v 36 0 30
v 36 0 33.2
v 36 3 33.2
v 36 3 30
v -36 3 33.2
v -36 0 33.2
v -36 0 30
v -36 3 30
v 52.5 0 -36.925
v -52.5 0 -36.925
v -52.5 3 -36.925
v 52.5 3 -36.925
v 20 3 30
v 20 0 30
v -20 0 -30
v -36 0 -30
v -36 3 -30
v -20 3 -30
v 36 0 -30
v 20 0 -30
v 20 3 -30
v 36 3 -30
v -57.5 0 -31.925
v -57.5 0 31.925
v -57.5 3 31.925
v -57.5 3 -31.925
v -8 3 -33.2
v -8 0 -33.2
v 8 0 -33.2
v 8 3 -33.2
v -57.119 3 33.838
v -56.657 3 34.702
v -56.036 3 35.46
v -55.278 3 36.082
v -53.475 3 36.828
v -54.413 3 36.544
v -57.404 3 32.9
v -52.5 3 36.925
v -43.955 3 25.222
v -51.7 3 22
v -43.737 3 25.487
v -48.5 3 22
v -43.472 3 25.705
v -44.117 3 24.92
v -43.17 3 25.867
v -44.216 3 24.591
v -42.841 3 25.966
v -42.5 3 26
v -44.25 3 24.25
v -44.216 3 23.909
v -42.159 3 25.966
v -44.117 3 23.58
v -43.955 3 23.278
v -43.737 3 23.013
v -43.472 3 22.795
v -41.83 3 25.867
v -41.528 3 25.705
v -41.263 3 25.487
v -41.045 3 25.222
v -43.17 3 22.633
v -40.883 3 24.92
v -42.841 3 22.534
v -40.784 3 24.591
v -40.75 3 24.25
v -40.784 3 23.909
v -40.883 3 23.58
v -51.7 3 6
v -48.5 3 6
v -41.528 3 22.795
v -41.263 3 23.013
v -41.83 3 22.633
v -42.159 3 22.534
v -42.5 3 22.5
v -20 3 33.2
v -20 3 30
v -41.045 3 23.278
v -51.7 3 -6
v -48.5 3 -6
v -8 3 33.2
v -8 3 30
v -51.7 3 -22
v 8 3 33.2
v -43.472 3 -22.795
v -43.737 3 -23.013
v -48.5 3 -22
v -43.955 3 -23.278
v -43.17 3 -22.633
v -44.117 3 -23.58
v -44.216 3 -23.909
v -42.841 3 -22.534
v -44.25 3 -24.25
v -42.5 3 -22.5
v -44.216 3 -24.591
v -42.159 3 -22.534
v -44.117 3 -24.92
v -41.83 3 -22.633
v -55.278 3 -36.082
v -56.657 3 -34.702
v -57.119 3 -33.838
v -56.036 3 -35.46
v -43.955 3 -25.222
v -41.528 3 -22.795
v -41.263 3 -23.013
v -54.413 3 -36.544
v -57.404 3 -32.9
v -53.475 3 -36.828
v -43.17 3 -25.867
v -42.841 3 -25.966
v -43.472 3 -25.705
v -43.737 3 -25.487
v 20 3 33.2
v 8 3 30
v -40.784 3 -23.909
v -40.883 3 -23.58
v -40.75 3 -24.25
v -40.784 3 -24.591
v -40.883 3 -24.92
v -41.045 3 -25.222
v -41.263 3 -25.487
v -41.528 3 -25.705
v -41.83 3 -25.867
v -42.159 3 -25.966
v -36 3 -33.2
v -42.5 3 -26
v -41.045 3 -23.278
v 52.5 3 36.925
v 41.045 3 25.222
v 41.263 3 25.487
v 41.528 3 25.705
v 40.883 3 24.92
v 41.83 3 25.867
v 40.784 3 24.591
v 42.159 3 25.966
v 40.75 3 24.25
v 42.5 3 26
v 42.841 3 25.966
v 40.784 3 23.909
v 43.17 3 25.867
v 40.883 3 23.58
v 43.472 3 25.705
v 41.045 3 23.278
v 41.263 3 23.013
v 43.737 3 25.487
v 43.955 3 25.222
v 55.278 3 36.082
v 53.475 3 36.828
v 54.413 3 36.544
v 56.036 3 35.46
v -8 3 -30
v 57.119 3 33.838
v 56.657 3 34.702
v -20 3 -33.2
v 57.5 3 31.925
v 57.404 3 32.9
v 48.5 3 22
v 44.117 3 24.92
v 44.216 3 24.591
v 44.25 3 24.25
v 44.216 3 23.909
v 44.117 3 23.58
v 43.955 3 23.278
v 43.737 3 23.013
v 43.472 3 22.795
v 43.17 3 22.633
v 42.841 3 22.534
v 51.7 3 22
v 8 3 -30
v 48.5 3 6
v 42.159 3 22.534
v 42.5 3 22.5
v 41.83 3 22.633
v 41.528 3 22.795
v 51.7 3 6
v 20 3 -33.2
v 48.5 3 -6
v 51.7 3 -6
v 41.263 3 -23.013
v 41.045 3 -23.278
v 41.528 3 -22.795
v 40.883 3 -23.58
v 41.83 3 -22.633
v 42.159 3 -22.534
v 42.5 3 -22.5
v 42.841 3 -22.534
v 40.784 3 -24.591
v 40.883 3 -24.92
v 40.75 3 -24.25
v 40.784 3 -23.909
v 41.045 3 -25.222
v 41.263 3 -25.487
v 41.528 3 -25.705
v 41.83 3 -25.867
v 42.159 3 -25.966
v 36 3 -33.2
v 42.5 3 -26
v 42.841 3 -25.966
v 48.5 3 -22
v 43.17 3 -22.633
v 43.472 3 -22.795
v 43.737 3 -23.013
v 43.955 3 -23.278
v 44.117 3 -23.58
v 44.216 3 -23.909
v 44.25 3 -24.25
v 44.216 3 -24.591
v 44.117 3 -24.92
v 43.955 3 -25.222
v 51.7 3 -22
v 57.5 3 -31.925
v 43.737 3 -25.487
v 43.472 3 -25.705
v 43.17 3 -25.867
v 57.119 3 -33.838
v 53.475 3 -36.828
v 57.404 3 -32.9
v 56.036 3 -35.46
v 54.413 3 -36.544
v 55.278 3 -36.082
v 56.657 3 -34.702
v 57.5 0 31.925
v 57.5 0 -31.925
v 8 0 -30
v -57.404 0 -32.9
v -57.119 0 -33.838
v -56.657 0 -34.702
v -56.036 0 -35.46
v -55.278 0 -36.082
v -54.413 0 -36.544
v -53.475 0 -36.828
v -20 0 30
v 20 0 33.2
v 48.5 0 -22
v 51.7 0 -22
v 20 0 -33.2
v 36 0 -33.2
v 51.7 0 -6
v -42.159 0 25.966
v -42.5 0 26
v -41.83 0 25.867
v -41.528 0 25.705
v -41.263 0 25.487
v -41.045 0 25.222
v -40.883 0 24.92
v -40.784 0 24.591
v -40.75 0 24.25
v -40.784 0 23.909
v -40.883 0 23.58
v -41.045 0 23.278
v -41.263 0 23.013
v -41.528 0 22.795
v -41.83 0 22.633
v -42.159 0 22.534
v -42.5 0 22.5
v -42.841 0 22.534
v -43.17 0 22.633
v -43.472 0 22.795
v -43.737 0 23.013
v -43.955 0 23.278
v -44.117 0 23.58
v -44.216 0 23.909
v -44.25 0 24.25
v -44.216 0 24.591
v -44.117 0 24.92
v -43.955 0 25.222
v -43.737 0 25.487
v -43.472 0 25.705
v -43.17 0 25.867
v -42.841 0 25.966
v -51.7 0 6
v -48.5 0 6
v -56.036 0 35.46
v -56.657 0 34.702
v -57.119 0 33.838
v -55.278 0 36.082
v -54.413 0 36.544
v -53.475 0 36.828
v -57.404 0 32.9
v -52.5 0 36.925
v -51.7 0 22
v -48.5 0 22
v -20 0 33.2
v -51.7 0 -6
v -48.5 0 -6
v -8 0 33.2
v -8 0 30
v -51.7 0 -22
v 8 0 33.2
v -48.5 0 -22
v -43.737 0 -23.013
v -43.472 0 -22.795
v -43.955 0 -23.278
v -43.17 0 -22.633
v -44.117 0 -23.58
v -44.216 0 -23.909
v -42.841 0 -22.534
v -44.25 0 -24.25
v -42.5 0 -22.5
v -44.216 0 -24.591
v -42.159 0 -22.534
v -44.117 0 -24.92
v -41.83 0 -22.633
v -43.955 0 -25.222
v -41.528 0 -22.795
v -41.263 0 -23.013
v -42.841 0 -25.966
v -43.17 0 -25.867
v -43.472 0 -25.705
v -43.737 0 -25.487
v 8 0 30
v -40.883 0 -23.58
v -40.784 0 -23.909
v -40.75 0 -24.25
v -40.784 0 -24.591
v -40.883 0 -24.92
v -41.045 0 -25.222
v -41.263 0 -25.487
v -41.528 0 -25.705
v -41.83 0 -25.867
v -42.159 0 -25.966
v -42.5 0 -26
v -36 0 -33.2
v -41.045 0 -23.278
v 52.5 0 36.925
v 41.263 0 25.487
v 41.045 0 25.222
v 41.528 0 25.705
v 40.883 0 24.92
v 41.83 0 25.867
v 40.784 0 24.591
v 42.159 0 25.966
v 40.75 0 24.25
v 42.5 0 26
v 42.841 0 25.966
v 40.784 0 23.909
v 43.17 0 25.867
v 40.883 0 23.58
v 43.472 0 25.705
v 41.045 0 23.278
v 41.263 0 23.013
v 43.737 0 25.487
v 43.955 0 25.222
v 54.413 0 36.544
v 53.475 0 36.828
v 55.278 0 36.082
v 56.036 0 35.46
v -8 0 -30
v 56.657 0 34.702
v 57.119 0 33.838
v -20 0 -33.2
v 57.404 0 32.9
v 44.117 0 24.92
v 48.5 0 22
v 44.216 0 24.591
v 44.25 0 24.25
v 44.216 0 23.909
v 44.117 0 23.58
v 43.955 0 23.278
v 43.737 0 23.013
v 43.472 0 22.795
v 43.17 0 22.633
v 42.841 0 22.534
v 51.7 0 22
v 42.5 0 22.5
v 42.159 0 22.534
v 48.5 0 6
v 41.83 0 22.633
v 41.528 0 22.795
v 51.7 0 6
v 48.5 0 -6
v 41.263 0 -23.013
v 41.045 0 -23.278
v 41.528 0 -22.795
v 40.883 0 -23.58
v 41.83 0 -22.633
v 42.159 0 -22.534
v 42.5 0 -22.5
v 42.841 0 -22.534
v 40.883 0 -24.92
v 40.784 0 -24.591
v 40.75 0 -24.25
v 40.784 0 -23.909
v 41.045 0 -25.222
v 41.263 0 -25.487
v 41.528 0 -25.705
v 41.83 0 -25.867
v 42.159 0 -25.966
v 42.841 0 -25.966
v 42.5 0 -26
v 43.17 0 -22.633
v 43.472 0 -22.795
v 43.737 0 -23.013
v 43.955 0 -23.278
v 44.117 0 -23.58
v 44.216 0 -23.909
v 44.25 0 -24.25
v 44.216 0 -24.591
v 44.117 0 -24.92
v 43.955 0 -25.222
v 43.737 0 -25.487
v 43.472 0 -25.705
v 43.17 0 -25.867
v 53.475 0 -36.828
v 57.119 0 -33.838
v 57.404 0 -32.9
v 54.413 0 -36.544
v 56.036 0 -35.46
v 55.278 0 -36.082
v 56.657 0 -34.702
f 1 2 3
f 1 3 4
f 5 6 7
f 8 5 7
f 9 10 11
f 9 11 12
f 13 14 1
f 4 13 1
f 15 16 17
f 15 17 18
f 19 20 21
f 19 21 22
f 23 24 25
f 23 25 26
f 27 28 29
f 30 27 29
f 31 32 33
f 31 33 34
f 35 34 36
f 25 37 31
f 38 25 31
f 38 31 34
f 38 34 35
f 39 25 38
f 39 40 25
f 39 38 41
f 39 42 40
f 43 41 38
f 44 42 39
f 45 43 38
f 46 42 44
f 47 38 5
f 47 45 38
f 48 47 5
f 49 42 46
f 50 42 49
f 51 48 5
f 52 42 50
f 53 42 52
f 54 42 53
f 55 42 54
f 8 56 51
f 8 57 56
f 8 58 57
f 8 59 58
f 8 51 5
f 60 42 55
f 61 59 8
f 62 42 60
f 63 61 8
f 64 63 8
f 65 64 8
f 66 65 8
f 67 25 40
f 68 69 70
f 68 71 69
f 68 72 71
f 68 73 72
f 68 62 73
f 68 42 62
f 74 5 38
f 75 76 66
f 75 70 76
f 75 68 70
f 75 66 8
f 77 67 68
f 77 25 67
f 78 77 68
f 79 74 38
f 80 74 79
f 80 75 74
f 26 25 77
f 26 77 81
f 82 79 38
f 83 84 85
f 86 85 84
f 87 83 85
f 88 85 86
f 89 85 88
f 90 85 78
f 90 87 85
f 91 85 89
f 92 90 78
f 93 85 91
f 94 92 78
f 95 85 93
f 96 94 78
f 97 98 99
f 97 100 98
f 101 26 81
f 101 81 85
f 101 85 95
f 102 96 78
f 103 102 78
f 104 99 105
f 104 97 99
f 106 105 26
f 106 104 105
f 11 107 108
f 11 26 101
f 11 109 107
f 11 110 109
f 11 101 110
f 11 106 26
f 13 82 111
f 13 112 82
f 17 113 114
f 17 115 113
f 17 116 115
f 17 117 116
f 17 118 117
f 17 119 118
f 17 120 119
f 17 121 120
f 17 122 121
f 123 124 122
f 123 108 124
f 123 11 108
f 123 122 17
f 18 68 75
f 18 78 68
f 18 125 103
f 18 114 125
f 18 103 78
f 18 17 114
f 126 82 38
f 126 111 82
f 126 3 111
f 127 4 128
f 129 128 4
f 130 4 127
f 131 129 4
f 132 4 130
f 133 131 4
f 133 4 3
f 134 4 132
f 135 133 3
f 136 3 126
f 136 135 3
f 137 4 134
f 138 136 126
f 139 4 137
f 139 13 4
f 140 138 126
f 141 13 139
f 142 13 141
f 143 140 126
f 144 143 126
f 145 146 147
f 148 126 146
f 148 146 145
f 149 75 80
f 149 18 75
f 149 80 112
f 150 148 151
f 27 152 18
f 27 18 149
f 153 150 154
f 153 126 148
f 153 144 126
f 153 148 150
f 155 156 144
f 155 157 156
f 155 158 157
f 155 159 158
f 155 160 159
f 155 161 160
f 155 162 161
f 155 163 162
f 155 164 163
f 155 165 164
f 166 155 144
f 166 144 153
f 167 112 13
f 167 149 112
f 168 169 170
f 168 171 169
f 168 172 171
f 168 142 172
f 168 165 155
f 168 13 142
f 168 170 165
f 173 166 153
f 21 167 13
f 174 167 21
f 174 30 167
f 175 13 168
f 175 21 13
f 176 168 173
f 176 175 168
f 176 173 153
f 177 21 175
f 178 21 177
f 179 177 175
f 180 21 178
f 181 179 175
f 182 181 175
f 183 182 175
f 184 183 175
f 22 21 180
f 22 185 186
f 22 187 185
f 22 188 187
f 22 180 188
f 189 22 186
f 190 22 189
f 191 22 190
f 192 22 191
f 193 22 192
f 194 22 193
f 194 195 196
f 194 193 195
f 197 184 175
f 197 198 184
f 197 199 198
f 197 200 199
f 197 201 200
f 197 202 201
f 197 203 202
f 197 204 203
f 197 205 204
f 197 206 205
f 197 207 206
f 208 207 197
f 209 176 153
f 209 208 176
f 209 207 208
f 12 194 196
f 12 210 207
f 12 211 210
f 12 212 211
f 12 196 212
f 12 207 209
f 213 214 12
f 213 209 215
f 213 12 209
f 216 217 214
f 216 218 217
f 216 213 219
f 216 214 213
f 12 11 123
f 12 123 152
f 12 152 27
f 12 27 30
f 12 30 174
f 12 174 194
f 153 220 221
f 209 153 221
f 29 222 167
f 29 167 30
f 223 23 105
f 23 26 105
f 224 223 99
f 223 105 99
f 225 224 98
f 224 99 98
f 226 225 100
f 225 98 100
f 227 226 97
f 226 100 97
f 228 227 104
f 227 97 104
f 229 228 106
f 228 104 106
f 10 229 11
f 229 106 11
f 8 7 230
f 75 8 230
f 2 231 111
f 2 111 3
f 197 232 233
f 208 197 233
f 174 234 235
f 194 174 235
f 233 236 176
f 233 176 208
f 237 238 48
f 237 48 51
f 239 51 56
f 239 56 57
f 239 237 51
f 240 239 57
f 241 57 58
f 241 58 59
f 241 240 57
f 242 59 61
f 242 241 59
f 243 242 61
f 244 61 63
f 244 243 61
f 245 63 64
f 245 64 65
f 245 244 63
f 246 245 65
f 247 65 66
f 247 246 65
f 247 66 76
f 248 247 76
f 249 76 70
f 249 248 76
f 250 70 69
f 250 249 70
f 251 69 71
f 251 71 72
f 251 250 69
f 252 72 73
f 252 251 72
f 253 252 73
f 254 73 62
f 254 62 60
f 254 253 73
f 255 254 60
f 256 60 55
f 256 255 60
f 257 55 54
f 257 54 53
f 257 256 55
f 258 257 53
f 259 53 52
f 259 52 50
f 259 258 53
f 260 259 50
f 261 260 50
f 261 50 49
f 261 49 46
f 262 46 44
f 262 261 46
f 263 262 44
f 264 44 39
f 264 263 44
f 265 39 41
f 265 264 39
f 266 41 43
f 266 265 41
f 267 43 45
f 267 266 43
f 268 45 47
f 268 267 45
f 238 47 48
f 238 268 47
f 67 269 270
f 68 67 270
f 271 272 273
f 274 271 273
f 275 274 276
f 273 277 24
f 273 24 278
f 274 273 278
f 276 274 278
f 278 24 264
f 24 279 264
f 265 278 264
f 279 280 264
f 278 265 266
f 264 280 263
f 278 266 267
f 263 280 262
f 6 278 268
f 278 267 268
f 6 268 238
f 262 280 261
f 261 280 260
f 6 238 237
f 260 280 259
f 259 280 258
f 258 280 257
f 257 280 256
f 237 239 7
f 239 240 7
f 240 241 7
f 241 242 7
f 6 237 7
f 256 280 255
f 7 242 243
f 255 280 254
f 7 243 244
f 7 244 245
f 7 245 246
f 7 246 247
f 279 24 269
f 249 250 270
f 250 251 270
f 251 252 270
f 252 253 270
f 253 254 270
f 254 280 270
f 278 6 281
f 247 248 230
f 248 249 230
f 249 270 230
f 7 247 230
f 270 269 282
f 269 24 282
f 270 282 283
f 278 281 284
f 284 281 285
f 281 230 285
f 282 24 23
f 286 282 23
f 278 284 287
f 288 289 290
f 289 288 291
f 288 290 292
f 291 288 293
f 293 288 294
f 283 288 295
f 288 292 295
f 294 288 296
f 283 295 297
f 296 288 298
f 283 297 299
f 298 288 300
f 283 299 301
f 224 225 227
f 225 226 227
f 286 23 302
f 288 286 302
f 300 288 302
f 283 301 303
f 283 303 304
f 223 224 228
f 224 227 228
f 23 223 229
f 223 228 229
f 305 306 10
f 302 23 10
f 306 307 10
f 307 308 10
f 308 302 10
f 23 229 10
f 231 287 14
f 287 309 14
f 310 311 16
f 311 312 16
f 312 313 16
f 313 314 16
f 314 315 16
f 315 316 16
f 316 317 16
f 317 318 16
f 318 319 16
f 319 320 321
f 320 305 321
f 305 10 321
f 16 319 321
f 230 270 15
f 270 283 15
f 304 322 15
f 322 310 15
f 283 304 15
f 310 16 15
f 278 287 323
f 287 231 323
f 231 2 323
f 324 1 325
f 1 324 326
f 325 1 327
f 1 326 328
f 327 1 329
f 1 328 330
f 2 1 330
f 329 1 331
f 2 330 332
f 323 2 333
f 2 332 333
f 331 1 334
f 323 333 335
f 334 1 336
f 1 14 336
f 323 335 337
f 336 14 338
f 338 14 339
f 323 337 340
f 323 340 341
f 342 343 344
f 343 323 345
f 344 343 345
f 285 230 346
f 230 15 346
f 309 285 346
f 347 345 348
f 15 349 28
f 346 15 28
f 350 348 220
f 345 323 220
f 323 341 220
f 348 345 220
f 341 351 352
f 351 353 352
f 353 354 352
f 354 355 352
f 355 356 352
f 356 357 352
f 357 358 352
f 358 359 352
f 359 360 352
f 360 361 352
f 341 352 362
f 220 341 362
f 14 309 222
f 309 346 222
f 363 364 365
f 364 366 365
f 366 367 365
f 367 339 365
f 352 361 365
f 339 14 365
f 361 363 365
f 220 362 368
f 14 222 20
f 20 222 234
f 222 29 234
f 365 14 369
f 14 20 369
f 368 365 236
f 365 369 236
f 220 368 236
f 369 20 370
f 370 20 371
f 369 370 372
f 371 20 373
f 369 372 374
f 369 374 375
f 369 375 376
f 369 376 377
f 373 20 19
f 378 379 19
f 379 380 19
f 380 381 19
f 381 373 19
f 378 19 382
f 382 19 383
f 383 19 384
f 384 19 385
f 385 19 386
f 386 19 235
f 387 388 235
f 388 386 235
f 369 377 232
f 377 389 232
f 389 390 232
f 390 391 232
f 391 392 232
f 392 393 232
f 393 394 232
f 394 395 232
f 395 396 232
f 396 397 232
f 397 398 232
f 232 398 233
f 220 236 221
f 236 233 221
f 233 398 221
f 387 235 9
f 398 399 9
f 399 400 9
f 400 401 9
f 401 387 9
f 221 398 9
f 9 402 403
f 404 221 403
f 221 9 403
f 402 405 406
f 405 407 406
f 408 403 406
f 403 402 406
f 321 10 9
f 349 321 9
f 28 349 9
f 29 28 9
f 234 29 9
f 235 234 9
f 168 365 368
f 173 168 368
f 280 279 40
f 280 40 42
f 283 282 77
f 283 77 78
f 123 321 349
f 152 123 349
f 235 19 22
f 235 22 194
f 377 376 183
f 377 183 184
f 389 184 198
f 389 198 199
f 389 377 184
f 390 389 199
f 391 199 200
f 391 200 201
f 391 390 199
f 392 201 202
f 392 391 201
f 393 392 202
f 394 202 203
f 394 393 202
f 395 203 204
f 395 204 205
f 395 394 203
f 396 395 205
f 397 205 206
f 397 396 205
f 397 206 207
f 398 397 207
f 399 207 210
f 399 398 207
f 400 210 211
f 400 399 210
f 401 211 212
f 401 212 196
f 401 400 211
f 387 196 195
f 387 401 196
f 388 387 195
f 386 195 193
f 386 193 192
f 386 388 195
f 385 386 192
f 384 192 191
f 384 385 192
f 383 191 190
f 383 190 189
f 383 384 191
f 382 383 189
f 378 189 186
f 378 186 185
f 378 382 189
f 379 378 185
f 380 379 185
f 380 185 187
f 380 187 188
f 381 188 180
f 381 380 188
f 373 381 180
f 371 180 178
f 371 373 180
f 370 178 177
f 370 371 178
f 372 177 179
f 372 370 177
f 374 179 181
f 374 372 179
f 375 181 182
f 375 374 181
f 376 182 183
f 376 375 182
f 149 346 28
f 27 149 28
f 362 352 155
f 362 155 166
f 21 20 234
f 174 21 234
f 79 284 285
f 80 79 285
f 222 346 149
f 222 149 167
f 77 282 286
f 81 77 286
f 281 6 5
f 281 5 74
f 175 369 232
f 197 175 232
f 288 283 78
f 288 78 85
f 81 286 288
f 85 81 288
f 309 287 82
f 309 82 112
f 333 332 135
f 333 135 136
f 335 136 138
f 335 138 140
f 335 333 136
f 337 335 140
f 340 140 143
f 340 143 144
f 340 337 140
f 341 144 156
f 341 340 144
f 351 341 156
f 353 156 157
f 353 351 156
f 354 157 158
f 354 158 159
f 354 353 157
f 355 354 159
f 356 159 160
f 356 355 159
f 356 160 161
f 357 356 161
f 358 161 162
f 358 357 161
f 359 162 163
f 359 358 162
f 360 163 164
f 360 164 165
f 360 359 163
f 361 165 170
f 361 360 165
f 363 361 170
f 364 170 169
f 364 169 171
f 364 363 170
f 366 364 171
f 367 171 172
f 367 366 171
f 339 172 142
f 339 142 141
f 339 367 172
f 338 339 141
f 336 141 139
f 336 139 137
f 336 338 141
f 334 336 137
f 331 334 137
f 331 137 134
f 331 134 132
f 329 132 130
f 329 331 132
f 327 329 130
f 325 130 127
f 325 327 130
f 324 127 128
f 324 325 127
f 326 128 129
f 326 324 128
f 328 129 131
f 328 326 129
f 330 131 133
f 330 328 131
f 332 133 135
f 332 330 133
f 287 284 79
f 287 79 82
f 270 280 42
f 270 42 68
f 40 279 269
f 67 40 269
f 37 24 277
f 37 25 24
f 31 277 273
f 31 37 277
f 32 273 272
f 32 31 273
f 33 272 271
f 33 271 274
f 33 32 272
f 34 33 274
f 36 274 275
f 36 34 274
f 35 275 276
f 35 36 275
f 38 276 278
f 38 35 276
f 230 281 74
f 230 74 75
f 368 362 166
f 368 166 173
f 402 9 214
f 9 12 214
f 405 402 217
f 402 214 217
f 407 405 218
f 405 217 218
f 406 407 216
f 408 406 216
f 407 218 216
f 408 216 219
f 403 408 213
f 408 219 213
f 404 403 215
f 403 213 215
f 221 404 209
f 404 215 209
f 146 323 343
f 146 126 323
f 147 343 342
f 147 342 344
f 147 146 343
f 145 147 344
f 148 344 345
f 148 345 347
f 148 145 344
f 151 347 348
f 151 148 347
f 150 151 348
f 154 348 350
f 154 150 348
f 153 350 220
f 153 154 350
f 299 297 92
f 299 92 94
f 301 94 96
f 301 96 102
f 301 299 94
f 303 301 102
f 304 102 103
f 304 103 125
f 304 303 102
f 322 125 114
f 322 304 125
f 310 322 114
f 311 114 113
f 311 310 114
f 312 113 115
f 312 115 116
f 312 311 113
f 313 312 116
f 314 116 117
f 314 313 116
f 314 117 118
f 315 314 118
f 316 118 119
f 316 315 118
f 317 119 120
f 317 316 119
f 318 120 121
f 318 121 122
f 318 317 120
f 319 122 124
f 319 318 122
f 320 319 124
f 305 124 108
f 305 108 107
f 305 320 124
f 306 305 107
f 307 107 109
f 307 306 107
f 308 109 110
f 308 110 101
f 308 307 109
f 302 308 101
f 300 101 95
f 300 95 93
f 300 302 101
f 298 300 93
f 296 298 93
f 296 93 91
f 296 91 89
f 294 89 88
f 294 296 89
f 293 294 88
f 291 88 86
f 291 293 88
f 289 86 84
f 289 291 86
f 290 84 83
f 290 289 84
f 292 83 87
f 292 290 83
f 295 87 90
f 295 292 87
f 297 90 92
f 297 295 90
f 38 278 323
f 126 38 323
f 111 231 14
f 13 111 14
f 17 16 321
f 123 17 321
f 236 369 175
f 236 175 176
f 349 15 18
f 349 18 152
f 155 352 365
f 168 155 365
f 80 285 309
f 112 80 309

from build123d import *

# Parameters (mm, degrees)
SKETCH1_W           = 115
SKETCH1_H           = 73.849129594
SKETCH1_R           = 1.75
SKETCH1_W_2         = 16
SKETCH1_H_2         = 3.2
SKETCH1_W_3         = 3.2
SKETCH1_H_3         = 16
BOSS_EXTRUDE1_DEPTH = 3
FILLET1_R           = 5


with BuildPart() as part:
    # Sketch1 → Boss-Extrude1 (new body)
    with BuildSketch(Plane(origin=(0, 0, 0), x_dir=(1, 0, 0), z_dir=(0, 1, 0))):
        Rectangle(SKETCH1_W, SKETCH1_H)
        with Locations(Location((-42.5, 24.25, 0), (0, 0, 270))):
            Circle(SKETCH1_R, mode=Mode.SUBTRACT)
        with Locations(Location((42.5, 24.25, 0), (0, 0, 270))):
            Circle(SKETCH1_R, mode=Mode.SUBTRACT)
        with Locations(Location((-42.5, -24.25, 0), (0, 0, 270))):
            Circle(SKETCH1_R, mode=Mode.SUBTRACT)
        with Locations(Location((42.5, -24.25, 0), (0, 0, 270))):
            Circle(SKETCH1_R, mode=Mode.SUBTRACT)
        with Locations((-28, 31.6)):
            Rectangle(SKETCH1_W_2, SKETCH1_H_2, mode=Mode.SUBTRACT)
        with Locations((28, 31.6)):
            Rectangle(SKETCH1_W_2, SKETCH1_H_2, mode=Mode.SUBTRACT)
        with Locations((-50.1, 14)):
            Rectangle(SKETCH1_W_3, SKETCH1_H_3, mode=Mode.SUBTRACT)
        with Locations((-50.1, -14)):
            Rectangle(SKETCH1_W_3, SKETCH1_H_3, mode=Mode.SUBTRACT)
        with Locations((0, 31.6)):
            Rectangle(SKETCH1_W_2, SKETCH1_H_2, mode=Mode.SUBTRACT)
        with Locations((-28, -31.6)):
            Rectangle(SKETCH1_W_2, SKETCH1_H_2, mode=Mode.SUBTRACT)
        with Locations((28, -31.6)):
            Rectangle(SKETCH1_W_2, SKETCH1_H_2, mode=Mode.SUBTRACT)
        with Locations((0, -31.6)):
            Rectangle(SKETCH1_W_2, SKETCH1_H_2, mode=Mode.SUBTRACT)
        with Locations((50.1, -14)):
            Rectangle(SKETCH1_W_3, SKETCH1_H_3, mode=Mode.SUBTRACT)
        with Locations((50.1, 14)):
            Rectangle(SKETCH1_W_3, SKETCH1_H_3, mode=Mode.SUBTRACT)
    extrude(amount=BOSS_EXTRUDE1_DEPTH)

    # Fillet1
    fillet1_edges = [part.edges().sort_by_distance(p)[0] for p in [
        (57.5, 1.5, 36.924564797),
        (-57.5, 1.5, 36.924564797),
        (-57.5, 1.5, -36.924564797),
        (57.5, 1.5, -36.924564797),
    ]]
    fillet(fillet1_edges, radius=FILLET1_R)


solid = part.part
